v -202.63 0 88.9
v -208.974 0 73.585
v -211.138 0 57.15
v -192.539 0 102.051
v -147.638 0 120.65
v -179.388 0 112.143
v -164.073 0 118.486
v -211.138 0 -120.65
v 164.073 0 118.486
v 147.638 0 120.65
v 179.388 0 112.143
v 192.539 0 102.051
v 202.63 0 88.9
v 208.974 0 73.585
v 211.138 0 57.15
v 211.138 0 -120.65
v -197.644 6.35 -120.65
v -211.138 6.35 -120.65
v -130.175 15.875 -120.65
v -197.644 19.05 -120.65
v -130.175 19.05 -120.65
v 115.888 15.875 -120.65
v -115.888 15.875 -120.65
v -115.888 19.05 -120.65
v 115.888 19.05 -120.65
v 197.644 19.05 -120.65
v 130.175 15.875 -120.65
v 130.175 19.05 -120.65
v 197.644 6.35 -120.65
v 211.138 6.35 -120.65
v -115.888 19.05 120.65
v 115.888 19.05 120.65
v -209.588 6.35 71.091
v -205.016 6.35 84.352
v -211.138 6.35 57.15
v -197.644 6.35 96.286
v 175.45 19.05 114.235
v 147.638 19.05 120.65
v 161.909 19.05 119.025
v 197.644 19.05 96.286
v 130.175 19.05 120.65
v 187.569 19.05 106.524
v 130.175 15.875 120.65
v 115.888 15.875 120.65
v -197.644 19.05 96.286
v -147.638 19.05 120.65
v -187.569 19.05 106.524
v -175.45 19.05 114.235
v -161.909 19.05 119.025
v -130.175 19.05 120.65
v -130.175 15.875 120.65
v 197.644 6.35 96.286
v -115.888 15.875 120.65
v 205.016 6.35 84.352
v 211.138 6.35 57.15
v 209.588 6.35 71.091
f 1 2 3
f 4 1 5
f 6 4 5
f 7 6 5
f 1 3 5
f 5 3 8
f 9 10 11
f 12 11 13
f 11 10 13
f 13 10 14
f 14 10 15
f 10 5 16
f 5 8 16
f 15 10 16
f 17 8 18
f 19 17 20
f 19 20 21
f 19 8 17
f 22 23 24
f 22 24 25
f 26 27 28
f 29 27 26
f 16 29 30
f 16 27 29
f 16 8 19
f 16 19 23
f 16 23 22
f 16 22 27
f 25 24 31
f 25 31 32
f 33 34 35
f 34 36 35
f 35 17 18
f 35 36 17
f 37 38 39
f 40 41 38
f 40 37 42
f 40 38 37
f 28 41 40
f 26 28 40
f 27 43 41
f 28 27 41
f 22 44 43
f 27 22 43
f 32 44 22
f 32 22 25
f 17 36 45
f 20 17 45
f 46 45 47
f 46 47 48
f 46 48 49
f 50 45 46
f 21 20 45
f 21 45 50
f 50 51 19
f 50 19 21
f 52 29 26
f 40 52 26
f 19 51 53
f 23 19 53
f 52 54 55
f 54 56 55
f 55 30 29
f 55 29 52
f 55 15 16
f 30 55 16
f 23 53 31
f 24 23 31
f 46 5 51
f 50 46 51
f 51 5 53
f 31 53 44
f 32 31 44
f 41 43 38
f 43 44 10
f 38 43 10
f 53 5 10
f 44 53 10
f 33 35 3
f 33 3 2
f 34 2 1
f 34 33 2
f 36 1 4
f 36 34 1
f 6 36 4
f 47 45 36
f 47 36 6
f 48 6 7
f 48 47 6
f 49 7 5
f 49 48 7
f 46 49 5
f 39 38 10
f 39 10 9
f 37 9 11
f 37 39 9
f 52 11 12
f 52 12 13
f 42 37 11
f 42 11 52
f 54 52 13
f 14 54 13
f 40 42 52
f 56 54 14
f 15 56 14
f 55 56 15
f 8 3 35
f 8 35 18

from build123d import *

# Parameters (mm, degrees)
SKETCH1_W           = 422.275
SKETCH1_H           = 241.3
BOSS_EXTRUDE1_DEPTH = 19.05
CUT_EXTRUDE1_REACH  = 323.197
SKETCH2_W           = 13.49375
SKETCH2_H           = 3.175
SKETCH2_W_2         = 14.2875
FILLET1_R           = 63.5
CUT_EXTRUDE2_REACH  = 323.197
SKETCH3_W           = 13.49375
SKETCH3_H           = 9.525


with BuildPart() as part:
    # Sketch1 → Boss-Extrude1 (new body)
    with BuildSketch(Plane(origin=(0, 0, 0), x_dir=(1, 0, 0), z_dir=(0, 1, 0))):
        Rectangle(SKETCH1_W, SKETCH1_H)
    extrude(amount=BOSS_EXTRUDE1_DEPTH)

    # Sketch2 → Cut-Extrude1 (cut, up to next)
    with BuildSketch(Plane.XY.offset(120.65), mode=Mode.PRIVATE) as cut_extrude1_sk1:
        with Locations((-204.390625, 17.4625)):
            Rectangle(SKETCH2_W, SKETCH2_H)
    cut_extrude1_tool1 = extrude(cut_extrude1_sk1.sketch, amount=-CUT_EXTRUDE1_REACH, mode=Mode.PRIVATE) & part.part
    # Sketch2 → Cut-Extrude1 (cut, up to next)
    with BuildSketch(Plane.XY.offset(120.65), mode=Mode.PRIVATE) as cut_extrude1_sk2:
        with Locations((-123.03125, 17.4625)):
            Rectangle(SKETCH2_W_2, SKETCH2_H)
    cut_extrude1_tool2 = extrude(cut_extrude1_sk2.sketch, amount=-CUT_EXTRUDE1_REACH, mode=Mode.PRIVATE) & part.part
    # Sketch2 → Cut-Extrude1 (cut, up to next)
    with BuildSketch(Plane.XY.offset(120.65), mode=Mode.PRIVATE) as cut_extrude1_sk3:
        with Locations((123.03125, 17.4625)):
            Rectangle(SKETCH2_W_2, SKETCH2_H)
    cut_extrude1_tool3 = extrude(cut_extrude1_sk3.sketch, amount=-CUT_EXTRUDE1_REACH, mode=Mode.PRIVATE) & part.part
    # Sketch2 → Cut-Extrude1 (cut, up to next)
    with BuildSketch(Plane.XY.offset(120.65), mode=Mode.PRIVATE) as cut_extrude1_sk4:
        with Locations((204.390625, 17.4625)):
            Rectangle(SKETCH2_W, SKETCH2_H)
    cut_extrude1_tool4 = extrude(cut_extrude1_sk4.sketch, amount=-CUT_EXTRUDE1_REACH, mode=Mode.PRIVATE) & part.part
    add(cut_extrude1_tool1.solids().sort_by_distance((-204.390625, 17.4625, 120.65))[0], mode=Mode.SUBTRACT)
    add(cut_extrude1_tool2.solids().sort_by_distance((-123.03125, 17.4625, 120.65))[0], mode=Mode.SUBTRACT)
    add(cut_extrude1_tool3.solids().sort_by_distance((123.03125, 17.4625, 120.65))[0], mode=Mode.SUBTRACT)
    add(cut_extrude1_tool4.solids().sort_by_distance((204.390625, 17.4625, 120.65))[0], mode=Mode.SUBTRACT)

    # Fillet1
    fillet1_edges = [part.edges().sort_by_distance(p)[0] for p in [
        (211.1375, 7.9375, 120.65),
        (-211.1375, 7.9375, 120.65),
    ]]
    fillet(fillet1_edges, radius=FILLET1_R)

    # Sketch3 → Cut-Extrude2 (cut, up to next)
    with BuildSketch(Plane(origin=(0, 0, -120.65), x_dir=(-1, 0, 0), z_dir=(0, 0, -1)), mode=Mode.PRIVATE) as cut_extrude2_sk1:
        with Locations((-204.390625, 11.1125)):
            Rectangle(SKETCH3_W, SKETCH3_H)
    cut_extrude2_tool1 = extrude(cut_extrude2_sk1.sketch, amount=-CUT_EXTRUDE2_REACH, mode=Mode.PRIVATE) & part.part
    # Sketch3 → Cut-Extrude2 (cut, up to next)
    with BuildSketch(Plane(origin=(0, 0, -120.65), x_dir=(-1, 0, 0), z_dir=(0, 0, -1)), mode=Mode.PRIVATE) as cut_extrude2_sk2:
        with Locations((204.390625, 11.1125)):
            Rectangle(SKETCH3_W, SKETCH3_H)
    cut_extrude2_tool2 = extrude(cut_extrude2_sk2.sketch, amount=-CUT_EXTRUDE2_REACH, mode=Mode.PRIVATE) & part.part
    add(cut_extrude2_tool1.solids().sort_by_distance((204.390625, 11.1125, -120.65))[0], mode=Mode.SUBTRACT)
    add(cut_extrude2_tool2.solids().sort_by_distance((-204.390625, 11.1125, -120.65))[0], mode=Mode.SUBTRACT)


solid = part.part
